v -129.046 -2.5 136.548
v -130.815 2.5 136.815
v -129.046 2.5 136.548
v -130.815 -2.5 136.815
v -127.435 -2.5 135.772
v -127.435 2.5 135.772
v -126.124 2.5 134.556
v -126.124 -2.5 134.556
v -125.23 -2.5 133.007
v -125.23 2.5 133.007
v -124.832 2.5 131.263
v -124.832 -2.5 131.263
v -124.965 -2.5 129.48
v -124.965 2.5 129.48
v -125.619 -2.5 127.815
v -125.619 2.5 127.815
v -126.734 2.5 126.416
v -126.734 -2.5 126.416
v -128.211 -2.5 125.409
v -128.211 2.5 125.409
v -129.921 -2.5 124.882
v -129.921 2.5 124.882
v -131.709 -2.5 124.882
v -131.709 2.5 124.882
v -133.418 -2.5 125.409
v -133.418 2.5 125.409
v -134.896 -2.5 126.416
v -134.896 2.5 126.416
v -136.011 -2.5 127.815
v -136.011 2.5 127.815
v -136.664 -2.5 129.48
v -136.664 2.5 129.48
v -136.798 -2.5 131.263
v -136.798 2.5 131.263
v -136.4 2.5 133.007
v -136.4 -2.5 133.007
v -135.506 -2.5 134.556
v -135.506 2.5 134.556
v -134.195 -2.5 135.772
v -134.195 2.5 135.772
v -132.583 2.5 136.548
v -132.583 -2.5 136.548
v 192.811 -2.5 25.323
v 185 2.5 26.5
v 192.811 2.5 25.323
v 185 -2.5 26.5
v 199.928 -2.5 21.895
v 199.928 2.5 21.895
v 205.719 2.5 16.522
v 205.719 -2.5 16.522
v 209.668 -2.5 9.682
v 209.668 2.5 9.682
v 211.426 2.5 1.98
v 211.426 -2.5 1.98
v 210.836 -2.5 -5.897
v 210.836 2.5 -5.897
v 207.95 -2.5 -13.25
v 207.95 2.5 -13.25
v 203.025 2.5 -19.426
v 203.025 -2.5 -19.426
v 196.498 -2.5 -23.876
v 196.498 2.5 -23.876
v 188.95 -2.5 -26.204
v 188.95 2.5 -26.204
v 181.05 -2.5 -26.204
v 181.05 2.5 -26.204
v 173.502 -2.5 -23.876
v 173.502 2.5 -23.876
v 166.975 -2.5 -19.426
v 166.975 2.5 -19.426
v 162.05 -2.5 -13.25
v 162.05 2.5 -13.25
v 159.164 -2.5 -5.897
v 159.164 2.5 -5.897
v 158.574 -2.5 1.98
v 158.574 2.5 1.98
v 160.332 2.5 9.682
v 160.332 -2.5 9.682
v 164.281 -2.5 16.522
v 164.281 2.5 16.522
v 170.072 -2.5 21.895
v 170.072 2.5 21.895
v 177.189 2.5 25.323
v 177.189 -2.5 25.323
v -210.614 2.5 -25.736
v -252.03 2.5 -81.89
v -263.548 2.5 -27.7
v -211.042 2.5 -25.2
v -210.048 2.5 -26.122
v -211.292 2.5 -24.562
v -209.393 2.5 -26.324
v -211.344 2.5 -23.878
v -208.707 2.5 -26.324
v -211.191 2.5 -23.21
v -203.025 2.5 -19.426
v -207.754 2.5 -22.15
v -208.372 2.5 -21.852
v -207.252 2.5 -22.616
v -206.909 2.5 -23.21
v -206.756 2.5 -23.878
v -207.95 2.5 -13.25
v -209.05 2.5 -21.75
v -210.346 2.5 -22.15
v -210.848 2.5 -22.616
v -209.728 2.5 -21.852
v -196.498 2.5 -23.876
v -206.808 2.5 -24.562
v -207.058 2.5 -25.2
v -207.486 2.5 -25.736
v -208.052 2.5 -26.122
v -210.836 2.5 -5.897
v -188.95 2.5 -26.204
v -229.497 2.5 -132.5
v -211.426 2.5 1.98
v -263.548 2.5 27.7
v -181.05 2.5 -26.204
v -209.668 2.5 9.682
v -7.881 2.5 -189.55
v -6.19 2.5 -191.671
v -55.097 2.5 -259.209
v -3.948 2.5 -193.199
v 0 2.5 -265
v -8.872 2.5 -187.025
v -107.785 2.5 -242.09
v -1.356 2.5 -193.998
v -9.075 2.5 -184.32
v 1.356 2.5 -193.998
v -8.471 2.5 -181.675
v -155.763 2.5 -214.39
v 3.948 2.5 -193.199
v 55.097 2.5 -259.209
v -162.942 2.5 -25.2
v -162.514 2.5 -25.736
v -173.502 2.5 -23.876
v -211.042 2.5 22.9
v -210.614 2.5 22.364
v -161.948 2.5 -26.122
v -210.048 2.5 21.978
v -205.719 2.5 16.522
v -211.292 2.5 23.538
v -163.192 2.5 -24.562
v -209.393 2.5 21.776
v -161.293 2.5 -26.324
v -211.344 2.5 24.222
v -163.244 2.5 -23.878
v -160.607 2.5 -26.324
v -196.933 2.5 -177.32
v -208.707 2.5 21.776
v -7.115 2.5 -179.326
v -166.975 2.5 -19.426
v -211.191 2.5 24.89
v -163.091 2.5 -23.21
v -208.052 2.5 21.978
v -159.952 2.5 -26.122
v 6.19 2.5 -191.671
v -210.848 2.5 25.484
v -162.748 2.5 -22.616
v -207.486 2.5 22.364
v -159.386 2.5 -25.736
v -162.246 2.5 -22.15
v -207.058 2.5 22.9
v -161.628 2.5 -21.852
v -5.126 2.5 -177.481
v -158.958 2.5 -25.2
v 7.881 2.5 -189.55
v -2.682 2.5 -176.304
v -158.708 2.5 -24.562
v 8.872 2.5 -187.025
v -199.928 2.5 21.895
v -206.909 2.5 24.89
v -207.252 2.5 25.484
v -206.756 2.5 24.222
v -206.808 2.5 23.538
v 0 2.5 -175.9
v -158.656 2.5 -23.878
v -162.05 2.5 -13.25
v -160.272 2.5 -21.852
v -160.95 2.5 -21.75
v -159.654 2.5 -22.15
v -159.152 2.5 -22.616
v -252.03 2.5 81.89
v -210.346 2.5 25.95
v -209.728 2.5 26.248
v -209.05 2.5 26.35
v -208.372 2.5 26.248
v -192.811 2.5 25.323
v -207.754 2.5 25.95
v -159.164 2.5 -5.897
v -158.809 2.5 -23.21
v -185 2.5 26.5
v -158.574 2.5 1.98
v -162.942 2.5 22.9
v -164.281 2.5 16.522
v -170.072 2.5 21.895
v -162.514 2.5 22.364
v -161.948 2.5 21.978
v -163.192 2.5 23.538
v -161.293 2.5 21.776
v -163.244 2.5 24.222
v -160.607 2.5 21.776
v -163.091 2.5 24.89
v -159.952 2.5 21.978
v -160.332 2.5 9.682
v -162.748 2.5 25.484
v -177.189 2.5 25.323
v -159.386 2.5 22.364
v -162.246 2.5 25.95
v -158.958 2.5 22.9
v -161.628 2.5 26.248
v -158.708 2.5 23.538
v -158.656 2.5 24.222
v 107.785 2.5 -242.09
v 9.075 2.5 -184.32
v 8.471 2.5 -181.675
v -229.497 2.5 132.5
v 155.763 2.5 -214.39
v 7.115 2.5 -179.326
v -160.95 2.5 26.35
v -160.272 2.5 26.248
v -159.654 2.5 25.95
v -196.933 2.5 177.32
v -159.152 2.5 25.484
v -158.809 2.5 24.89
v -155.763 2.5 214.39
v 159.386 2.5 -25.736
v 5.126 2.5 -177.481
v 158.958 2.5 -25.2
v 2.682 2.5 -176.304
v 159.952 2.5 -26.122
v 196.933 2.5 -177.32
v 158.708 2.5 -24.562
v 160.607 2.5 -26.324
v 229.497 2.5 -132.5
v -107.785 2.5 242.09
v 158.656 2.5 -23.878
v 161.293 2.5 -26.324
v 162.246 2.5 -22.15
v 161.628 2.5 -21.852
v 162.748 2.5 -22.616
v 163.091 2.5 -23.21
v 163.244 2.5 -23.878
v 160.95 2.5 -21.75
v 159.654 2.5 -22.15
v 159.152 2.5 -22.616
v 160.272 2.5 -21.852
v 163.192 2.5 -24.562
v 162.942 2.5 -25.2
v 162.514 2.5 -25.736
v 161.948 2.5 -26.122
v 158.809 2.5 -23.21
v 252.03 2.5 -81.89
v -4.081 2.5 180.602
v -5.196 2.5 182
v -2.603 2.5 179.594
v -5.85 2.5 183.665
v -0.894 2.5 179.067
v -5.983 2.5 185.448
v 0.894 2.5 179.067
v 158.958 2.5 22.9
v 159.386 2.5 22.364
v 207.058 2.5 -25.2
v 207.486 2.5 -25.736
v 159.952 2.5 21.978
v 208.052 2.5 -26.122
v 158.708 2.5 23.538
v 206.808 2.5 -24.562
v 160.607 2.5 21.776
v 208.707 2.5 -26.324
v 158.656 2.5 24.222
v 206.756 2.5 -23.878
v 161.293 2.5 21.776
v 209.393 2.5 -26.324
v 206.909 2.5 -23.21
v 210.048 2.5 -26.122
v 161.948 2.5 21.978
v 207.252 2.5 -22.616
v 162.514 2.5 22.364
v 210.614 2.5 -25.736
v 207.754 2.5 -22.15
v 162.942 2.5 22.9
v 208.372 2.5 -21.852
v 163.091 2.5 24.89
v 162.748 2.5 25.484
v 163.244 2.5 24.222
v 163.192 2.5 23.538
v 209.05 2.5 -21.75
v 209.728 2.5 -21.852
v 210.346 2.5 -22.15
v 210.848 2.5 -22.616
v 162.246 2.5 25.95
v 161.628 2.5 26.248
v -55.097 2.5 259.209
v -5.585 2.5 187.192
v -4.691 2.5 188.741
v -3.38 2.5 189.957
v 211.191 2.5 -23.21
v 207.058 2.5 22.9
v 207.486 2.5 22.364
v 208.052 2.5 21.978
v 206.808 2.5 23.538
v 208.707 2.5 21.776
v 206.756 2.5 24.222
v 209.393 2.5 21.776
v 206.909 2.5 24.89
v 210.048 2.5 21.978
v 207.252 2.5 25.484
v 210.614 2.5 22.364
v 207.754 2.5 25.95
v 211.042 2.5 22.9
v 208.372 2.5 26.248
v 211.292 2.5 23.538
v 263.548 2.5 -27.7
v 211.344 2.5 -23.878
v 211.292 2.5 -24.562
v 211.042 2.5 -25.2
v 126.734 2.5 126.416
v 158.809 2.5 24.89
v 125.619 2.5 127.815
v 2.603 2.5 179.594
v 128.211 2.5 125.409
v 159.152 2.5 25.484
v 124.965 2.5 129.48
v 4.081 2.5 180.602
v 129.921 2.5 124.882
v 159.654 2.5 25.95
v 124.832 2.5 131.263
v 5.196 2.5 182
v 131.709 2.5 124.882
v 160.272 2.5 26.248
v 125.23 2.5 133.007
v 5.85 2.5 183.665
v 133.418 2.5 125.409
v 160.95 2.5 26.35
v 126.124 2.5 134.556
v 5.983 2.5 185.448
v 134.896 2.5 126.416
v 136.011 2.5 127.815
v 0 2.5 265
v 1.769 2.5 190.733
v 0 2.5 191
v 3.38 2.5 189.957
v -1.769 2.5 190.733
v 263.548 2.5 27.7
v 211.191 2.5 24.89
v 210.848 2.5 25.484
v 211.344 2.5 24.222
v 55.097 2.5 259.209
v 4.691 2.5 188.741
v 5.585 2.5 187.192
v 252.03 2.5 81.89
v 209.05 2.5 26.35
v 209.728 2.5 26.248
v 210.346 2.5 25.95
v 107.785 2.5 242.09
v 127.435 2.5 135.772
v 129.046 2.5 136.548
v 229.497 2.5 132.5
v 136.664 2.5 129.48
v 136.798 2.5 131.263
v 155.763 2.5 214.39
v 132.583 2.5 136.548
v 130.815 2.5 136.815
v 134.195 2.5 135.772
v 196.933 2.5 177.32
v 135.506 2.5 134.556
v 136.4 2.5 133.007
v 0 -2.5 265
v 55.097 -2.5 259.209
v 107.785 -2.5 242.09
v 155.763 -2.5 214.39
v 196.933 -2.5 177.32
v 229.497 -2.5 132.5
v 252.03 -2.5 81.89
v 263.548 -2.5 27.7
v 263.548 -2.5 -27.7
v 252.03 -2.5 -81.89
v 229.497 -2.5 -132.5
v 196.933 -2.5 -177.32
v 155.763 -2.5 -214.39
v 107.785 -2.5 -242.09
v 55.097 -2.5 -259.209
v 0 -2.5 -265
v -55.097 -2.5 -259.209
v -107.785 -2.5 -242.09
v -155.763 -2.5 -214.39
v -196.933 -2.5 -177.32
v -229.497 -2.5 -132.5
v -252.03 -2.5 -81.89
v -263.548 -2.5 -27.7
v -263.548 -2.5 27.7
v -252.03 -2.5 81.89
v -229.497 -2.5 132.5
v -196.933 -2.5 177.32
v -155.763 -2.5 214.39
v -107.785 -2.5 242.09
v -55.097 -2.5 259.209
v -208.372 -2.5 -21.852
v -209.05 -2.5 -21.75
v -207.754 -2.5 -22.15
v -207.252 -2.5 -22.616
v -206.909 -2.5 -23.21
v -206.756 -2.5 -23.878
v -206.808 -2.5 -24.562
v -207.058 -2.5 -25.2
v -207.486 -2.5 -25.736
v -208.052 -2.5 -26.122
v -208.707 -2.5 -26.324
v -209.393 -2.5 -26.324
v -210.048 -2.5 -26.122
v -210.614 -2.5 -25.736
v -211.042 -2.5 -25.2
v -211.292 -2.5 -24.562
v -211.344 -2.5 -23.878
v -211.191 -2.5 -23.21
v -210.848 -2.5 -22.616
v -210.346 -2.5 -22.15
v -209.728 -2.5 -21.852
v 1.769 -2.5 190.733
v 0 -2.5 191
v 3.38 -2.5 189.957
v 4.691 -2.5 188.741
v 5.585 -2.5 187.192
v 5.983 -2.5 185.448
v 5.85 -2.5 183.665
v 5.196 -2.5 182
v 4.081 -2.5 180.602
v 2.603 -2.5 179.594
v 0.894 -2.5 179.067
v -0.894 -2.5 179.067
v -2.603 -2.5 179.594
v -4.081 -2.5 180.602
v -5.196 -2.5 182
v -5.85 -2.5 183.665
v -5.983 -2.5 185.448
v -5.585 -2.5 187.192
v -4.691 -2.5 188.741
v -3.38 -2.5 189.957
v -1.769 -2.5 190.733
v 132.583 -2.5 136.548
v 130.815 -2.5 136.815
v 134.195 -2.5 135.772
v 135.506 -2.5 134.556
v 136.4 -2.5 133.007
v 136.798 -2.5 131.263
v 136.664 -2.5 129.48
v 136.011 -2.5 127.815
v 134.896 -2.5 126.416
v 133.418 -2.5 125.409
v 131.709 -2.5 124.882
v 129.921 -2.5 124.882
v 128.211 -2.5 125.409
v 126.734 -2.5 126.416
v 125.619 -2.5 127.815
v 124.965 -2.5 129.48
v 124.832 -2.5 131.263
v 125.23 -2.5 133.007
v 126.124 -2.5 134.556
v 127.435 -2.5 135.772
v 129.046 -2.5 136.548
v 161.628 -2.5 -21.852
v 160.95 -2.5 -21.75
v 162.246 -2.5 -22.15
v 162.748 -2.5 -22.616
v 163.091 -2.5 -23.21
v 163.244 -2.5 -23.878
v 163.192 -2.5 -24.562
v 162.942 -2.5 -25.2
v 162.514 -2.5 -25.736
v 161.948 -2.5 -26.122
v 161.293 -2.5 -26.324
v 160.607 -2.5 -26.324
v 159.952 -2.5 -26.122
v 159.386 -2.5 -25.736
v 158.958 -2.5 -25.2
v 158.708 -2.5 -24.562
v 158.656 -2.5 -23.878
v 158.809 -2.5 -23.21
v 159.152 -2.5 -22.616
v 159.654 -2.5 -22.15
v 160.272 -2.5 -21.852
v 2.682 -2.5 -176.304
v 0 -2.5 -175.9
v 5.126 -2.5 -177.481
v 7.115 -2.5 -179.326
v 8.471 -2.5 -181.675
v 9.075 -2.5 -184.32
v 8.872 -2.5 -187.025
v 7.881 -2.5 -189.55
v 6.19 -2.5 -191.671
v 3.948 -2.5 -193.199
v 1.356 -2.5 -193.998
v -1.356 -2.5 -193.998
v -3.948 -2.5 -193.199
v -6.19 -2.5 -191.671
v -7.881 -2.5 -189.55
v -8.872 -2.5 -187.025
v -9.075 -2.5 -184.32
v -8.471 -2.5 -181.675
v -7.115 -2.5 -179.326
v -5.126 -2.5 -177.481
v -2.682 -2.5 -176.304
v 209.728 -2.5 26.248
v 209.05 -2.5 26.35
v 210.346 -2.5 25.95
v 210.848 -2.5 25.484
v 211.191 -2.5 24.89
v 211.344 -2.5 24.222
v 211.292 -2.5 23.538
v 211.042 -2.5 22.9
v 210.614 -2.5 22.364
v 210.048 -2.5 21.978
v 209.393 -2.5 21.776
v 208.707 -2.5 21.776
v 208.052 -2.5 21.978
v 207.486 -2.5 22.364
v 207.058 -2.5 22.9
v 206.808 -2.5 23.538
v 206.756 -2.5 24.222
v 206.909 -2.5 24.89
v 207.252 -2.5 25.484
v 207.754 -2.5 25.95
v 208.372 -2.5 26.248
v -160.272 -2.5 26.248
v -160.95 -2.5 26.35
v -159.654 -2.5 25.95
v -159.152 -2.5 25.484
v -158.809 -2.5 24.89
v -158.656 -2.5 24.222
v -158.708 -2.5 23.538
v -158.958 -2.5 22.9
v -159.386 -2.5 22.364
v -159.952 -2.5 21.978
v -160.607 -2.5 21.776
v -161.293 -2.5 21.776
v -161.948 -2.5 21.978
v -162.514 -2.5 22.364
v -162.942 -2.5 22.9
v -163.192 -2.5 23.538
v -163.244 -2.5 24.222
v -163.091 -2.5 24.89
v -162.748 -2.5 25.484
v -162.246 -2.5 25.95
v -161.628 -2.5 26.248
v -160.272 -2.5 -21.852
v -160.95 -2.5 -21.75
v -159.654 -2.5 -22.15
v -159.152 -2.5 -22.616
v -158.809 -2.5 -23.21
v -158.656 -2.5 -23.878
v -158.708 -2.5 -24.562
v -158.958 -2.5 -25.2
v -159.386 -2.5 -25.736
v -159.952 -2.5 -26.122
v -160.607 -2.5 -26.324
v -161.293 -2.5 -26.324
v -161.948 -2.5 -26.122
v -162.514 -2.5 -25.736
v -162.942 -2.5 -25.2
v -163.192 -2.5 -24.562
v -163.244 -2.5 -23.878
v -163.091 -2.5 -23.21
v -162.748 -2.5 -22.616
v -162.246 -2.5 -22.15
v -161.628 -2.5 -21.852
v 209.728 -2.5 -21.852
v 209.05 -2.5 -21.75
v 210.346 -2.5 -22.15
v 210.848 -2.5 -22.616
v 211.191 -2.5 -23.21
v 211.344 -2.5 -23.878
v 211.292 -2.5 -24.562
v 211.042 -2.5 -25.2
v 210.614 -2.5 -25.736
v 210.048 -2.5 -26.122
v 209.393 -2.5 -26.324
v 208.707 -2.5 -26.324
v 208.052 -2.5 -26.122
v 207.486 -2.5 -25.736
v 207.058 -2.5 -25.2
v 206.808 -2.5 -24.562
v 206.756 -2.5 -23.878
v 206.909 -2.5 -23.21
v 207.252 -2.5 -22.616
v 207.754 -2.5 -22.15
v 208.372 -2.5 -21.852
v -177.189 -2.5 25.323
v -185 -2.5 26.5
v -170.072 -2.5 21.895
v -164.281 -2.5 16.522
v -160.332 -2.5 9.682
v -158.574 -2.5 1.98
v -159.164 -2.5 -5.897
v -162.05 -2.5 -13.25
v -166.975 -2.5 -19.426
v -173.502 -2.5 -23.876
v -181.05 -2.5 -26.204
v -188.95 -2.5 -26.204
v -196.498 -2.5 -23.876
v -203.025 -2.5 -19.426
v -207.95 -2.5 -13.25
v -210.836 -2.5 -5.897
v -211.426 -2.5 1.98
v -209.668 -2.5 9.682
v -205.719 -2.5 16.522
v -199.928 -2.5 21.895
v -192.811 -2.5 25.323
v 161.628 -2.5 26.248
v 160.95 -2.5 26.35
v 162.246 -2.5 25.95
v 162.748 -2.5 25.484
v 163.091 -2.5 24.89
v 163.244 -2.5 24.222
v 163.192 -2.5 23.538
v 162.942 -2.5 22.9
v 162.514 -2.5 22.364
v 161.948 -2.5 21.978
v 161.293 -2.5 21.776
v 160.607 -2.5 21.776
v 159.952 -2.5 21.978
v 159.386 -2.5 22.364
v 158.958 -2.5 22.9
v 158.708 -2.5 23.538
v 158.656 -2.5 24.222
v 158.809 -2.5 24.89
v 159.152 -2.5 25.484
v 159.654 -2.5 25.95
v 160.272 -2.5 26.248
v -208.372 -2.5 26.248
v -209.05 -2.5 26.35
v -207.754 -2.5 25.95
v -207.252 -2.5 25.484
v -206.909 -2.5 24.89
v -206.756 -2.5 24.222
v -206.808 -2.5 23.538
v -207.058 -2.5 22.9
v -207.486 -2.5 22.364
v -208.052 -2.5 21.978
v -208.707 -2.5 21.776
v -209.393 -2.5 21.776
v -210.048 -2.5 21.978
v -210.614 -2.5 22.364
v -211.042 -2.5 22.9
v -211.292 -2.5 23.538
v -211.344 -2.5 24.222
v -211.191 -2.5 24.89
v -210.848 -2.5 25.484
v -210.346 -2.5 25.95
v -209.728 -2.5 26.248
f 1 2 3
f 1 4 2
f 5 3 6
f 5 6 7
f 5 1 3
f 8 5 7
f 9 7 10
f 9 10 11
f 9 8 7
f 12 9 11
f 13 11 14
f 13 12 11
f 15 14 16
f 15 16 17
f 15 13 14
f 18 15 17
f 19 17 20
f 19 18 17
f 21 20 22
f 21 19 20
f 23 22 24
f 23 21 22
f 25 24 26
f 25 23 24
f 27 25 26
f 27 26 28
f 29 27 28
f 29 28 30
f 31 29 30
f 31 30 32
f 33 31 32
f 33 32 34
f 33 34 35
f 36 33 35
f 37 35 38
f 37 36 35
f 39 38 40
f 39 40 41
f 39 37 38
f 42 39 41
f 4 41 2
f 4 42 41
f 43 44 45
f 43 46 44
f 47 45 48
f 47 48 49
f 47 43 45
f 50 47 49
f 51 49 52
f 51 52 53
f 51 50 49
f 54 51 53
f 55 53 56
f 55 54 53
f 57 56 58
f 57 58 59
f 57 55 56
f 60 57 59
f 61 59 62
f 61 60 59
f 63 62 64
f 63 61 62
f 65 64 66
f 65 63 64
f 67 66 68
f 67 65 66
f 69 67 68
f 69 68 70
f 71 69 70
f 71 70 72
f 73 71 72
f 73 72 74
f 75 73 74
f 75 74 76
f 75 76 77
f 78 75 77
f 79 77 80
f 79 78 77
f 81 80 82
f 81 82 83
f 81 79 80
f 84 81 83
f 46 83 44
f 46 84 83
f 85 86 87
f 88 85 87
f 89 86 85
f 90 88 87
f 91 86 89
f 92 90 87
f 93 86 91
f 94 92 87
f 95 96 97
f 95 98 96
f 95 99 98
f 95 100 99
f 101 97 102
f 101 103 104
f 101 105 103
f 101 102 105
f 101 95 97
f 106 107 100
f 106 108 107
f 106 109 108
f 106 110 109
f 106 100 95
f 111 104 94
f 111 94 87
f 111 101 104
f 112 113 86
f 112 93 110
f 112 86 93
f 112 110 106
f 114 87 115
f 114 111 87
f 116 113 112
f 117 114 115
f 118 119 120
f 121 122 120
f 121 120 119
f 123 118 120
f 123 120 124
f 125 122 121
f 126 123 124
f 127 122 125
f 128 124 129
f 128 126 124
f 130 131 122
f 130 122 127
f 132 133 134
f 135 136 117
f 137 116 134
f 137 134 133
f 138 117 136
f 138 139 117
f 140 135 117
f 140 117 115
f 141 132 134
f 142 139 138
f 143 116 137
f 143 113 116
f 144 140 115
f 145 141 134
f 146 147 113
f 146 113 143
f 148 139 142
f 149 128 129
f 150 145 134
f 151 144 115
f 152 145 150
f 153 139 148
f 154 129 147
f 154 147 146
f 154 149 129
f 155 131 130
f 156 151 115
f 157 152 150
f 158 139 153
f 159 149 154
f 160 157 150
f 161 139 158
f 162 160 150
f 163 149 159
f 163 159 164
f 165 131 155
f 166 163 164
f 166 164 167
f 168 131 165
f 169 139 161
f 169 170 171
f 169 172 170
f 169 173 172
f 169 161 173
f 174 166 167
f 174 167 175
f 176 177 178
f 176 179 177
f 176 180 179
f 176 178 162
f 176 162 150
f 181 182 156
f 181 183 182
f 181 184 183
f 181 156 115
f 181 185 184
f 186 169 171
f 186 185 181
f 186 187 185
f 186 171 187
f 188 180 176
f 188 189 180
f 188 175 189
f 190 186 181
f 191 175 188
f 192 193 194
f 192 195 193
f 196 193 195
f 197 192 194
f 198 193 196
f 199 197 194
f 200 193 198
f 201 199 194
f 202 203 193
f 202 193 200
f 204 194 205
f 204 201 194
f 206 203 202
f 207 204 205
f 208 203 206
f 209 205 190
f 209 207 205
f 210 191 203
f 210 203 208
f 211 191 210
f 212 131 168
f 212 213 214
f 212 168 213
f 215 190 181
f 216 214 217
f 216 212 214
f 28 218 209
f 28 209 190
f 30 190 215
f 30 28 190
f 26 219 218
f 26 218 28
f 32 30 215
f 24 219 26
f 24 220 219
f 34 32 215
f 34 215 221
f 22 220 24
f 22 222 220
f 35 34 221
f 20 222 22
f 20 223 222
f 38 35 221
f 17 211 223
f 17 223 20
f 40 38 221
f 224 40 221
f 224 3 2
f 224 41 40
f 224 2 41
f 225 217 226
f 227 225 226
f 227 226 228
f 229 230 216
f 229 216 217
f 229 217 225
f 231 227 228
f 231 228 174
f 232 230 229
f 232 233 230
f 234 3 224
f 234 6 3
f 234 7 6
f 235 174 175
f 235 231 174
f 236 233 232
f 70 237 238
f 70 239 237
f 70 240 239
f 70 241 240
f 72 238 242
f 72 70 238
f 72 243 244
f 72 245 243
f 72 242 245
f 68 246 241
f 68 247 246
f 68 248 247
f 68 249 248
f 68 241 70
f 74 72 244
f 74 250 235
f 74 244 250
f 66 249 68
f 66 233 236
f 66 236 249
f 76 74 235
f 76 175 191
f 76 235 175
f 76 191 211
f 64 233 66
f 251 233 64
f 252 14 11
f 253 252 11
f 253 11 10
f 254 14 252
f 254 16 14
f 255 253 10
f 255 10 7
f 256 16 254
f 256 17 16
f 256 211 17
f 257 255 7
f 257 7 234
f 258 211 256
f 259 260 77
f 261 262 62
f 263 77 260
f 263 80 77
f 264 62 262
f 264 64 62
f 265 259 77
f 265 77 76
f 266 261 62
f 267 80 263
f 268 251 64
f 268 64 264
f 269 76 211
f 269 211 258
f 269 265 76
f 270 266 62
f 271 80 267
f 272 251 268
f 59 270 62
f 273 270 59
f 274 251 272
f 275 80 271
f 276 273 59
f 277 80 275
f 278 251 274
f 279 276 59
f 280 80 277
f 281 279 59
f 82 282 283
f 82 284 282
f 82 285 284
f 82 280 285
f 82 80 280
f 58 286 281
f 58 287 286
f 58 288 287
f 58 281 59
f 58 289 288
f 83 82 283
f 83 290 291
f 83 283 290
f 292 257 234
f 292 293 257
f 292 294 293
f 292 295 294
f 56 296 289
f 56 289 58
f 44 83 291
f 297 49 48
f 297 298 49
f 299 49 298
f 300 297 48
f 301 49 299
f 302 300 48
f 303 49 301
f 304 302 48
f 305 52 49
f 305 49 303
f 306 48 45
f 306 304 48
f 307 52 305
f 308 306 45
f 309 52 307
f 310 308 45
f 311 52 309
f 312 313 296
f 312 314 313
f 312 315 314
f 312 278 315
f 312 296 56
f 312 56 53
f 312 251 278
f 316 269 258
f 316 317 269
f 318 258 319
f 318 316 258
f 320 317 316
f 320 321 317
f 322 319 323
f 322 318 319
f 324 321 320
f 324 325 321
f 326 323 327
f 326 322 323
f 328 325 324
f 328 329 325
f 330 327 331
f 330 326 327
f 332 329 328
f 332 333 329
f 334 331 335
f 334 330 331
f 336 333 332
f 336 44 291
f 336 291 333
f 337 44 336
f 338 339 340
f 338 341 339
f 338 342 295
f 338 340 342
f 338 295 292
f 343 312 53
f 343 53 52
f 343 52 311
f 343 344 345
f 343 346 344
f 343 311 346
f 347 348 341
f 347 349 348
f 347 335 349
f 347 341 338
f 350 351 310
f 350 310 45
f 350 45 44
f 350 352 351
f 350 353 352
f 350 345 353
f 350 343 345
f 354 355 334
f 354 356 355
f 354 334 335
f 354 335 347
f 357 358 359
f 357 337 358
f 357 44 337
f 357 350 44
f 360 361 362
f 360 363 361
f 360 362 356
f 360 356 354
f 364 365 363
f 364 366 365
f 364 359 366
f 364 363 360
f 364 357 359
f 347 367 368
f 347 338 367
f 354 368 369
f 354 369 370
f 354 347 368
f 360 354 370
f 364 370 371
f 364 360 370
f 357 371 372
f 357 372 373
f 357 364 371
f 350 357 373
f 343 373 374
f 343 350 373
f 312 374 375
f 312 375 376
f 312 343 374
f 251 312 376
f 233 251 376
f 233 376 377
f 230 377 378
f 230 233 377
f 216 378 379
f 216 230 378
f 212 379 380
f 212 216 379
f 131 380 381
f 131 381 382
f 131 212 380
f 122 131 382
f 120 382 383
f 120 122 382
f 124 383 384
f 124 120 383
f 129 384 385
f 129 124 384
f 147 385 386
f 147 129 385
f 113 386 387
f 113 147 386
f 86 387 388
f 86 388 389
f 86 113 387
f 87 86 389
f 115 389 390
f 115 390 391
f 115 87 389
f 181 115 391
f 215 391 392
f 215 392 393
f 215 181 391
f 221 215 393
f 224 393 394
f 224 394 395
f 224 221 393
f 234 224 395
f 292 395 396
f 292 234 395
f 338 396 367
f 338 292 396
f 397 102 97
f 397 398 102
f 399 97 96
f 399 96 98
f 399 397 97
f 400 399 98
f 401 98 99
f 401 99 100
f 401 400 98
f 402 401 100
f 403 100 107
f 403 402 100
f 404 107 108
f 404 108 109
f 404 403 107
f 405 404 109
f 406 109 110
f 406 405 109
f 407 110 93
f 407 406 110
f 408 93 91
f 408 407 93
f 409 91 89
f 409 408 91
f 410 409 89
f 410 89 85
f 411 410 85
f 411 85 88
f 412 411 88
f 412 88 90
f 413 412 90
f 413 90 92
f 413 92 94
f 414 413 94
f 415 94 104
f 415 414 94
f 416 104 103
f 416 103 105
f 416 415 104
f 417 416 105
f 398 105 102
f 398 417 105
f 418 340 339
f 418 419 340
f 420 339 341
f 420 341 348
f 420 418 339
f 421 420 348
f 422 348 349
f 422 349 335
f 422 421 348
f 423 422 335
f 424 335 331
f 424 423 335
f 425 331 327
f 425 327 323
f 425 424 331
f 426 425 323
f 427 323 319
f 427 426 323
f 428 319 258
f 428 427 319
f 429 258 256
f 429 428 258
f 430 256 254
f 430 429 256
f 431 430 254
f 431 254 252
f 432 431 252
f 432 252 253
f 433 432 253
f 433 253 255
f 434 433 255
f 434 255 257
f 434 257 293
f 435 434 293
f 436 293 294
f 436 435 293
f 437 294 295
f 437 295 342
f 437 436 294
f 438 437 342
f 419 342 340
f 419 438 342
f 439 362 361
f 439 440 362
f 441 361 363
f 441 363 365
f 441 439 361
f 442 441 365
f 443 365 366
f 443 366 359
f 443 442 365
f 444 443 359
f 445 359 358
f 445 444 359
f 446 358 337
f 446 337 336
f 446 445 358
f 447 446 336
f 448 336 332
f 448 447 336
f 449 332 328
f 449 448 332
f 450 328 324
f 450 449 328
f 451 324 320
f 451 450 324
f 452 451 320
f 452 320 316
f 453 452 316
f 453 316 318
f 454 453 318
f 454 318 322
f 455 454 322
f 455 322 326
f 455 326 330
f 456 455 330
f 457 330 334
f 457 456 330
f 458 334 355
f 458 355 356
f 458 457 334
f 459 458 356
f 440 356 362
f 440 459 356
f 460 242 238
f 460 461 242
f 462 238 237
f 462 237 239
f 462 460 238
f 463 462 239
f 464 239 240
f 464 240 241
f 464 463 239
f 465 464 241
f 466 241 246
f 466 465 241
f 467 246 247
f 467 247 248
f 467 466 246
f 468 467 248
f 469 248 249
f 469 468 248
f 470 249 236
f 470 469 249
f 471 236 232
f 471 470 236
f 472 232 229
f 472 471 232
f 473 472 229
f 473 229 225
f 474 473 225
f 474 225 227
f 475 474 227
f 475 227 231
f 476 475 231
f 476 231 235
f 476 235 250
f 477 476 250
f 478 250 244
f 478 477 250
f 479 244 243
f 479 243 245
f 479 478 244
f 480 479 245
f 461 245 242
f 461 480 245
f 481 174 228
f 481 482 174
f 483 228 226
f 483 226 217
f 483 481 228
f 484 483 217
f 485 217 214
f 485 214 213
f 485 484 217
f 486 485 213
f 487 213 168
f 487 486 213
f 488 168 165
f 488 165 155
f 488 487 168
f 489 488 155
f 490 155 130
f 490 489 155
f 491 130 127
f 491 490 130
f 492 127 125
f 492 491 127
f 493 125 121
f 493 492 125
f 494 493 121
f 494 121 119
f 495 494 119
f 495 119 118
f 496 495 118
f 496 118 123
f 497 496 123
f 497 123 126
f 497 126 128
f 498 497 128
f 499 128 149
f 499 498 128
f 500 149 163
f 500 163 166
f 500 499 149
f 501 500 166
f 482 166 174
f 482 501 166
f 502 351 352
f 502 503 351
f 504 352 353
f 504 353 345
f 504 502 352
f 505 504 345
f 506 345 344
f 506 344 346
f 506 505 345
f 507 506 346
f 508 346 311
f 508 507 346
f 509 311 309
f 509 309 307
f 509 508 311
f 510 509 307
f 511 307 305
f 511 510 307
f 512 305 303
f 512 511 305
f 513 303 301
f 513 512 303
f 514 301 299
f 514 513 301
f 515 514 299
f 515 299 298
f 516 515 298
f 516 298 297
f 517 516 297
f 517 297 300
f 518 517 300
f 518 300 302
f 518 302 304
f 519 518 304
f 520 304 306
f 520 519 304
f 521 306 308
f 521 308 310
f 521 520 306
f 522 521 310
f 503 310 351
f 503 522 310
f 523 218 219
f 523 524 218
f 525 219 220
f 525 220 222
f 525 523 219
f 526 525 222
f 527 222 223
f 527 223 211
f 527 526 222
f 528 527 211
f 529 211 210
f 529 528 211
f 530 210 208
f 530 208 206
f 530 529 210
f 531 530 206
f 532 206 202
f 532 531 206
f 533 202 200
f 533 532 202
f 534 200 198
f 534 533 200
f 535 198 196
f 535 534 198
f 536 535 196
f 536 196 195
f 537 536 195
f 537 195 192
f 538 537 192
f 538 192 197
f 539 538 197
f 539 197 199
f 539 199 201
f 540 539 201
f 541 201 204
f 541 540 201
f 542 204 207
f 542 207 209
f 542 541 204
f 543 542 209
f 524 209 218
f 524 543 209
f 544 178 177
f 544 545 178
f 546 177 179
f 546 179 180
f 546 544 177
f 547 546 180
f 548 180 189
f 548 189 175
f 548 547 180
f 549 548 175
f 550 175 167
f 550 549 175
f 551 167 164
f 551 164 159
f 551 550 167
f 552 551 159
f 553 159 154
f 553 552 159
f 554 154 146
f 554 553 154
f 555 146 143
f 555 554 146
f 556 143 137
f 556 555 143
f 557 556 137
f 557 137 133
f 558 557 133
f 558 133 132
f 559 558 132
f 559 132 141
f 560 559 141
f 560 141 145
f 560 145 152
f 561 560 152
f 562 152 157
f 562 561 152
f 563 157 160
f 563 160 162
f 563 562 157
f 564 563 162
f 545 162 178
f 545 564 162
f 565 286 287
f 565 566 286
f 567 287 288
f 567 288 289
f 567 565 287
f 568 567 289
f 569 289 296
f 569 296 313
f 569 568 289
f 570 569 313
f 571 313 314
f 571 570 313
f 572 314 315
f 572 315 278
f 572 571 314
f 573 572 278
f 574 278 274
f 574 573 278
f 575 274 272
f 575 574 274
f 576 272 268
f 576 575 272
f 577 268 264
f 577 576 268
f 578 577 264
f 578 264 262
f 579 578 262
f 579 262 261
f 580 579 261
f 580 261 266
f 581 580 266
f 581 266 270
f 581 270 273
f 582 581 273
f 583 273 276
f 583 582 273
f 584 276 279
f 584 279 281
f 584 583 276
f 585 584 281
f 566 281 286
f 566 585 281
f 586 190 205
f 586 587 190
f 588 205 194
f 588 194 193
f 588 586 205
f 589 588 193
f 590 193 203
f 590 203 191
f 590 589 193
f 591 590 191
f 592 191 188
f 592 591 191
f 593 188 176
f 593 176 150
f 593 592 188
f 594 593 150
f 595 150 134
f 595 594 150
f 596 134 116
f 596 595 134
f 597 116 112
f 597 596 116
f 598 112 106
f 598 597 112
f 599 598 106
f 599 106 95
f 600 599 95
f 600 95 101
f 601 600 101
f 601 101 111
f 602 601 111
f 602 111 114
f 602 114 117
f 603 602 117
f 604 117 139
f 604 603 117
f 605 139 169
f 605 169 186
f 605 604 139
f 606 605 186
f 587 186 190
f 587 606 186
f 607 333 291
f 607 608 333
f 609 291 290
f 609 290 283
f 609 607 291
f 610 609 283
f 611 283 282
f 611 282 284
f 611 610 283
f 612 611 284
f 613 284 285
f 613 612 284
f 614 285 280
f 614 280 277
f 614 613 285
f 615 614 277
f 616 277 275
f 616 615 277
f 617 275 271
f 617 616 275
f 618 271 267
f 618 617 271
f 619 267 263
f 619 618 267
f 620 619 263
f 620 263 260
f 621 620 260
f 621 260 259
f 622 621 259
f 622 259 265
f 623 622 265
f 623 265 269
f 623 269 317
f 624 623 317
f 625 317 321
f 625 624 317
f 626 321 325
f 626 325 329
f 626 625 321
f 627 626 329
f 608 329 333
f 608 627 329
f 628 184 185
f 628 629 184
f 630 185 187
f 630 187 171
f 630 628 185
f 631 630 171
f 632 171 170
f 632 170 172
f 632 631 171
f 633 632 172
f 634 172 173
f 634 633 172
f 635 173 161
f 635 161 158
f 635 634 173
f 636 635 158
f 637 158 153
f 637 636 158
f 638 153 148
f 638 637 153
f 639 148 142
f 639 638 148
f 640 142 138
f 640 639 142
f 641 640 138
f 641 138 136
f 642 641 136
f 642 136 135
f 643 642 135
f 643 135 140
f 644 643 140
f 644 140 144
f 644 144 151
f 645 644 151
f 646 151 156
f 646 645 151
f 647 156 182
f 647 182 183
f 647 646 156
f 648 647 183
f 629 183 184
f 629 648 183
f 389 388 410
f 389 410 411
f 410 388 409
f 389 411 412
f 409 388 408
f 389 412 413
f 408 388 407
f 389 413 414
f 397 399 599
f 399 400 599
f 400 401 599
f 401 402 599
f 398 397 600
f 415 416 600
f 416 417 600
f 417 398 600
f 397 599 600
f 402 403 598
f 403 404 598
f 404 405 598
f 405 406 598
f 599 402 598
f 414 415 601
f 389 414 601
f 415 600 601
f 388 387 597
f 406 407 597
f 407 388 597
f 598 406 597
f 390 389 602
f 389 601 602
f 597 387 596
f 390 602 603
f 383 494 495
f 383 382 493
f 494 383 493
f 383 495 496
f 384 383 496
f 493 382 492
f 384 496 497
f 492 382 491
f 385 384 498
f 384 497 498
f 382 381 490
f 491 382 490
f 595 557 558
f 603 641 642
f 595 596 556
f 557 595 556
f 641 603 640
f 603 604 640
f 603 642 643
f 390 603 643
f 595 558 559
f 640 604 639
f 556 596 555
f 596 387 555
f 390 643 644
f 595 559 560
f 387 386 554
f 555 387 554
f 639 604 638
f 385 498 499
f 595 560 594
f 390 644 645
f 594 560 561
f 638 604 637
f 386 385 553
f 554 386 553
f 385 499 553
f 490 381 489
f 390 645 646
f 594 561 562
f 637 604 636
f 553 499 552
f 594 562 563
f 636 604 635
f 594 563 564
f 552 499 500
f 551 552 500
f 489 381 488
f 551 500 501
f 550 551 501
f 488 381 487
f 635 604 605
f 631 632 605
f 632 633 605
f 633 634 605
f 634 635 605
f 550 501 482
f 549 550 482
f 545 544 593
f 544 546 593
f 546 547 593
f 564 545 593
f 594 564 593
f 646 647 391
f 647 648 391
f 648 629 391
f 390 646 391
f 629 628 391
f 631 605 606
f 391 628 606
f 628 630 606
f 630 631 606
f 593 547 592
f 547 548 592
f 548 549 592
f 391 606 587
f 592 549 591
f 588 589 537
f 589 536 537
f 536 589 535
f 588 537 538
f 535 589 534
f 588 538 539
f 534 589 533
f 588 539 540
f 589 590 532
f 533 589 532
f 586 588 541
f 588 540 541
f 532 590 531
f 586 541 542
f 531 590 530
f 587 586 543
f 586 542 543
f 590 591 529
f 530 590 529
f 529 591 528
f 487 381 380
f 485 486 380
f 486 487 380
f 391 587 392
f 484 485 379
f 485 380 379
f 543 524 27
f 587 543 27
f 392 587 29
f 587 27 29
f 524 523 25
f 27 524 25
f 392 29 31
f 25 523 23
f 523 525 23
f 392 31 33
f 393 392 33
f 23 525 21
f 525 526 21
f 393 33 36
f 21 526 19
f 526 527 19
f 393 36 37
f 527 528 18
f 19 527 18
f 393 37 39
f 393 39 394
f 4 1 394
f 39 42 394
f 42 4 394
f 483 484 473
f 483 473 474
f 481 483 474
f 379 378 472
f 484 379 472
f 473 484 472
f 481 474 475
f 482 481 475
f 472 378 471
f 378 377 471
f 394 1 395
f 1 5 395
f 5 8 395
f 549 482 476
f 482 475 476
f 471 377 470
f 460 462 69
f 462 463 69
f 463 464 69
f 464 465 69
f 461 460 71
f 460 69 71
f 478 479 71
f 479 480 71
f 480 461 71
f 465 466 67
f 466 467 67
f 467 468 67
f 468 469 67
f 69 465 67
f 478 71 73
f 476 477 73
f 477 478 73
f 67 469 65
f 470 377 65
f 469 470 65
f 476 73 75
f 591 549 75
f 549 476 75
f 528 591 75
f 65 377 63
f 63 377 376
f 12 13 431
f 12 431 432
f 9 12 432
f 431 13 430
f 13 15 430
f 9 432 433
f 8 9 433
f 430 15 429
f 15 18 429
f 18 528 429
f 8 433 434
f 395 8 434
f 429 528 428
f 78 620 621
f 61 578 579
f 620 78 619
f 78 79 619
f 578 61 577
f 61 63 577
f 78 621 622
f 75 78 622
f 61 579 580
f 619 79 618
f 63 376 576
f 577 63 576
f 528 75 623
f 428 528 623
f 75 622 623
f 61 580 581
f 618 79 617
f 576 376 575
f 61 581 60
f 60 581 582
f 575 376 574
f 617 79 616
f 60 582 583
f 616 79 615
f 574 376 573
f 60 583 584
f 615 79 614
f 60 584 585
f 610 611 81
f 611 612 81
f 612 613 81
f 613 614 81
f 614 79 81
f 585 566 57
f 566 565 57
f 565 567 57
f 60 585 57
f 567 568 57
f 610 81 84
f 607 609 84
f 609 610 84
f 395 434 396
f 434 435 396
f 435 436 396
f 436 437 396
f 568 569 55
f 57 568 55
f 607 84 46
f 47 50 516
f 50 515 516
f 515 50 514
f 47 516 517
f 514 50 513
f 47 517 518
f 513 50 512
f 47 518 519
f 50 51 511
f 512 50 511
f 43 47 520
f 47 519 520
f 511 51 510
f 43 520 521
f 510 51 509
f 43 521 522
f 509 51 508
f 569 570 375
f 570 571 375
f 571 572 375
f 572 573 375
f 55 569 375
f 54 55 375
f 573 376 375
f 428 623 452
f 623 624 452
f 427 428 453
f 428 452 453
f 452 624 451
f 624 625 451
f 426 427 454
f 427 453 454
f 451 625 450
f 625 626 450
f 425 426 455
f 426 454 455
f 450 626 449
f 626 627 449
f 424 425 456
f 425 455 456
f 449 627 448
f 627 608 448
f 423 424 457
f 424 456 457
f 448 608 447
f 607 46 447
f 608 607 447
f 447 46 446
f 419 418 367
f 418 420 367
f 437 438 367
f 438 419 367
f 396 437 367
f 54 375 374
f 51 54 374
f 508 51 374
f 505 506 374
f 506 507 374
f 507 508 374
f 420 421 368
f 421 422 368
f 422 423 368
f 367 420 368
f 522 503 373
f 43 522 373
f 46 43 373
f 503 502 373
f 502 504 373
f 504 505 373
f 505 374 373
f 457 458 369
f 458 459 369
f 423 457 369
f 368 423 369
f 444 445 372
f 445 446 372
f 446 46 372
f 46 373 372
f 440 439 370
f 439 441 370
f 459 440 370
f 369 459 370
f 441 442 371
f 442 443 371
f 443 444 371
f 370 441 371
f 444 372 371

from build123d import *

# Parameters (mm, degrees)
SKETCH1_R           = 265
SKETCH1_R_2         = 26.5
SKETCH1_R_3         = 2.3
SKETCH1_R_4         = 9.1
SKETCH1_R_5         = 6
BOSS_EXTRUDE1_DEPTH = 2.5


with BuildPart() as part:
    # Sketch1 → Boss-Extrude1 (new, symmetric)
    with BuildSketch(Plane(origin=(0, 0, 0), x_dir=(1, 0, 0), z_dir=(0, 1, 0))):
        with Locations(Location((0, 0, 0), (0, 0, 270))):
            Circle(SKETCH1_R)
        with Locations(Location((-185, 0, 0), (0, 0, 270))):
            Circle(SKETCH1_R_2, mode=Mode.SUBTRACT)
        with Locations(Location((185, 0, 0), (0, 0, 270))):
            Circle(SKETCH1_R_2, mode=Mode.SUBTRACT)
        with Locations(Location((-209.05, 24.05, 0), (0, 0, 270))):
            Circle(SKETCH1_R_3, mode=Mode.SUBTRACT)
        with Locations(Location((-160.95, 24.05, 0), (0, 0, 270))):
            Circle(SKETCH1_R_3, mode=Mode.SUBTRACT)
        with Locations(Location((-160.95, -24.05, 0), (0, 0, 270))):
            Circle(SKETCH1_R_3, mode=Mode.SUBTRACT)
        with Locations(Location((-209.05, -24.05, 0), (0, 0, 270))):
            Circle(SKETCH1_R_3, mode=Mode.SUBTRACT)
        with Locations(Location((209.05, -24.05, 0), (0, 0, 270))):
            Circle(SKETCH1_R_3, mode=Mode.SUBTRACT)
        with Locations(Location((160.95, -24.05, 0), (0, 0, 270))):
            Circle(SKETCH1_R_3, mode=Mode.SUBTRACT)
        with Locations(Location((160.95, 24.05, 0), (0, 0, 270))):
            Circle(SKETCH1_R_3, mode=Mode.SUBTRACT)
        with Locations(Location((209.05, 24.05, 0), (0, 0, 270))):
            Circle(SKETCH1_R_3, mode=Mode.SUBTRACT)
        with Locations(Location((0, 185, 0), (0, 0, 270))):
            Circle(SKETCH1_R_4, mode=Mode.SUBTRACT)
        with Locations(Location((-130.81475452, -130.81475452, 0), (0, 0, 270))):
            Circle(SKETCH1_R_5, mode=Mode.SUBTRACT)
        with Locations(Location((130.81475452, -130.81475452, 0), (0, 0, 270))):
            Circle(SKETCH1_R_5, mode=Mode.SUBTRACT)
        with Locations(Location((0, -185, 0), (0, 0, 270))):
            Circle(SKETCH1_R_5, mode=Mode.SUBTRACT)
    extrude(amount=BOSS_EXTRUDE1_DEPTH, both=True)


solid = part.part
